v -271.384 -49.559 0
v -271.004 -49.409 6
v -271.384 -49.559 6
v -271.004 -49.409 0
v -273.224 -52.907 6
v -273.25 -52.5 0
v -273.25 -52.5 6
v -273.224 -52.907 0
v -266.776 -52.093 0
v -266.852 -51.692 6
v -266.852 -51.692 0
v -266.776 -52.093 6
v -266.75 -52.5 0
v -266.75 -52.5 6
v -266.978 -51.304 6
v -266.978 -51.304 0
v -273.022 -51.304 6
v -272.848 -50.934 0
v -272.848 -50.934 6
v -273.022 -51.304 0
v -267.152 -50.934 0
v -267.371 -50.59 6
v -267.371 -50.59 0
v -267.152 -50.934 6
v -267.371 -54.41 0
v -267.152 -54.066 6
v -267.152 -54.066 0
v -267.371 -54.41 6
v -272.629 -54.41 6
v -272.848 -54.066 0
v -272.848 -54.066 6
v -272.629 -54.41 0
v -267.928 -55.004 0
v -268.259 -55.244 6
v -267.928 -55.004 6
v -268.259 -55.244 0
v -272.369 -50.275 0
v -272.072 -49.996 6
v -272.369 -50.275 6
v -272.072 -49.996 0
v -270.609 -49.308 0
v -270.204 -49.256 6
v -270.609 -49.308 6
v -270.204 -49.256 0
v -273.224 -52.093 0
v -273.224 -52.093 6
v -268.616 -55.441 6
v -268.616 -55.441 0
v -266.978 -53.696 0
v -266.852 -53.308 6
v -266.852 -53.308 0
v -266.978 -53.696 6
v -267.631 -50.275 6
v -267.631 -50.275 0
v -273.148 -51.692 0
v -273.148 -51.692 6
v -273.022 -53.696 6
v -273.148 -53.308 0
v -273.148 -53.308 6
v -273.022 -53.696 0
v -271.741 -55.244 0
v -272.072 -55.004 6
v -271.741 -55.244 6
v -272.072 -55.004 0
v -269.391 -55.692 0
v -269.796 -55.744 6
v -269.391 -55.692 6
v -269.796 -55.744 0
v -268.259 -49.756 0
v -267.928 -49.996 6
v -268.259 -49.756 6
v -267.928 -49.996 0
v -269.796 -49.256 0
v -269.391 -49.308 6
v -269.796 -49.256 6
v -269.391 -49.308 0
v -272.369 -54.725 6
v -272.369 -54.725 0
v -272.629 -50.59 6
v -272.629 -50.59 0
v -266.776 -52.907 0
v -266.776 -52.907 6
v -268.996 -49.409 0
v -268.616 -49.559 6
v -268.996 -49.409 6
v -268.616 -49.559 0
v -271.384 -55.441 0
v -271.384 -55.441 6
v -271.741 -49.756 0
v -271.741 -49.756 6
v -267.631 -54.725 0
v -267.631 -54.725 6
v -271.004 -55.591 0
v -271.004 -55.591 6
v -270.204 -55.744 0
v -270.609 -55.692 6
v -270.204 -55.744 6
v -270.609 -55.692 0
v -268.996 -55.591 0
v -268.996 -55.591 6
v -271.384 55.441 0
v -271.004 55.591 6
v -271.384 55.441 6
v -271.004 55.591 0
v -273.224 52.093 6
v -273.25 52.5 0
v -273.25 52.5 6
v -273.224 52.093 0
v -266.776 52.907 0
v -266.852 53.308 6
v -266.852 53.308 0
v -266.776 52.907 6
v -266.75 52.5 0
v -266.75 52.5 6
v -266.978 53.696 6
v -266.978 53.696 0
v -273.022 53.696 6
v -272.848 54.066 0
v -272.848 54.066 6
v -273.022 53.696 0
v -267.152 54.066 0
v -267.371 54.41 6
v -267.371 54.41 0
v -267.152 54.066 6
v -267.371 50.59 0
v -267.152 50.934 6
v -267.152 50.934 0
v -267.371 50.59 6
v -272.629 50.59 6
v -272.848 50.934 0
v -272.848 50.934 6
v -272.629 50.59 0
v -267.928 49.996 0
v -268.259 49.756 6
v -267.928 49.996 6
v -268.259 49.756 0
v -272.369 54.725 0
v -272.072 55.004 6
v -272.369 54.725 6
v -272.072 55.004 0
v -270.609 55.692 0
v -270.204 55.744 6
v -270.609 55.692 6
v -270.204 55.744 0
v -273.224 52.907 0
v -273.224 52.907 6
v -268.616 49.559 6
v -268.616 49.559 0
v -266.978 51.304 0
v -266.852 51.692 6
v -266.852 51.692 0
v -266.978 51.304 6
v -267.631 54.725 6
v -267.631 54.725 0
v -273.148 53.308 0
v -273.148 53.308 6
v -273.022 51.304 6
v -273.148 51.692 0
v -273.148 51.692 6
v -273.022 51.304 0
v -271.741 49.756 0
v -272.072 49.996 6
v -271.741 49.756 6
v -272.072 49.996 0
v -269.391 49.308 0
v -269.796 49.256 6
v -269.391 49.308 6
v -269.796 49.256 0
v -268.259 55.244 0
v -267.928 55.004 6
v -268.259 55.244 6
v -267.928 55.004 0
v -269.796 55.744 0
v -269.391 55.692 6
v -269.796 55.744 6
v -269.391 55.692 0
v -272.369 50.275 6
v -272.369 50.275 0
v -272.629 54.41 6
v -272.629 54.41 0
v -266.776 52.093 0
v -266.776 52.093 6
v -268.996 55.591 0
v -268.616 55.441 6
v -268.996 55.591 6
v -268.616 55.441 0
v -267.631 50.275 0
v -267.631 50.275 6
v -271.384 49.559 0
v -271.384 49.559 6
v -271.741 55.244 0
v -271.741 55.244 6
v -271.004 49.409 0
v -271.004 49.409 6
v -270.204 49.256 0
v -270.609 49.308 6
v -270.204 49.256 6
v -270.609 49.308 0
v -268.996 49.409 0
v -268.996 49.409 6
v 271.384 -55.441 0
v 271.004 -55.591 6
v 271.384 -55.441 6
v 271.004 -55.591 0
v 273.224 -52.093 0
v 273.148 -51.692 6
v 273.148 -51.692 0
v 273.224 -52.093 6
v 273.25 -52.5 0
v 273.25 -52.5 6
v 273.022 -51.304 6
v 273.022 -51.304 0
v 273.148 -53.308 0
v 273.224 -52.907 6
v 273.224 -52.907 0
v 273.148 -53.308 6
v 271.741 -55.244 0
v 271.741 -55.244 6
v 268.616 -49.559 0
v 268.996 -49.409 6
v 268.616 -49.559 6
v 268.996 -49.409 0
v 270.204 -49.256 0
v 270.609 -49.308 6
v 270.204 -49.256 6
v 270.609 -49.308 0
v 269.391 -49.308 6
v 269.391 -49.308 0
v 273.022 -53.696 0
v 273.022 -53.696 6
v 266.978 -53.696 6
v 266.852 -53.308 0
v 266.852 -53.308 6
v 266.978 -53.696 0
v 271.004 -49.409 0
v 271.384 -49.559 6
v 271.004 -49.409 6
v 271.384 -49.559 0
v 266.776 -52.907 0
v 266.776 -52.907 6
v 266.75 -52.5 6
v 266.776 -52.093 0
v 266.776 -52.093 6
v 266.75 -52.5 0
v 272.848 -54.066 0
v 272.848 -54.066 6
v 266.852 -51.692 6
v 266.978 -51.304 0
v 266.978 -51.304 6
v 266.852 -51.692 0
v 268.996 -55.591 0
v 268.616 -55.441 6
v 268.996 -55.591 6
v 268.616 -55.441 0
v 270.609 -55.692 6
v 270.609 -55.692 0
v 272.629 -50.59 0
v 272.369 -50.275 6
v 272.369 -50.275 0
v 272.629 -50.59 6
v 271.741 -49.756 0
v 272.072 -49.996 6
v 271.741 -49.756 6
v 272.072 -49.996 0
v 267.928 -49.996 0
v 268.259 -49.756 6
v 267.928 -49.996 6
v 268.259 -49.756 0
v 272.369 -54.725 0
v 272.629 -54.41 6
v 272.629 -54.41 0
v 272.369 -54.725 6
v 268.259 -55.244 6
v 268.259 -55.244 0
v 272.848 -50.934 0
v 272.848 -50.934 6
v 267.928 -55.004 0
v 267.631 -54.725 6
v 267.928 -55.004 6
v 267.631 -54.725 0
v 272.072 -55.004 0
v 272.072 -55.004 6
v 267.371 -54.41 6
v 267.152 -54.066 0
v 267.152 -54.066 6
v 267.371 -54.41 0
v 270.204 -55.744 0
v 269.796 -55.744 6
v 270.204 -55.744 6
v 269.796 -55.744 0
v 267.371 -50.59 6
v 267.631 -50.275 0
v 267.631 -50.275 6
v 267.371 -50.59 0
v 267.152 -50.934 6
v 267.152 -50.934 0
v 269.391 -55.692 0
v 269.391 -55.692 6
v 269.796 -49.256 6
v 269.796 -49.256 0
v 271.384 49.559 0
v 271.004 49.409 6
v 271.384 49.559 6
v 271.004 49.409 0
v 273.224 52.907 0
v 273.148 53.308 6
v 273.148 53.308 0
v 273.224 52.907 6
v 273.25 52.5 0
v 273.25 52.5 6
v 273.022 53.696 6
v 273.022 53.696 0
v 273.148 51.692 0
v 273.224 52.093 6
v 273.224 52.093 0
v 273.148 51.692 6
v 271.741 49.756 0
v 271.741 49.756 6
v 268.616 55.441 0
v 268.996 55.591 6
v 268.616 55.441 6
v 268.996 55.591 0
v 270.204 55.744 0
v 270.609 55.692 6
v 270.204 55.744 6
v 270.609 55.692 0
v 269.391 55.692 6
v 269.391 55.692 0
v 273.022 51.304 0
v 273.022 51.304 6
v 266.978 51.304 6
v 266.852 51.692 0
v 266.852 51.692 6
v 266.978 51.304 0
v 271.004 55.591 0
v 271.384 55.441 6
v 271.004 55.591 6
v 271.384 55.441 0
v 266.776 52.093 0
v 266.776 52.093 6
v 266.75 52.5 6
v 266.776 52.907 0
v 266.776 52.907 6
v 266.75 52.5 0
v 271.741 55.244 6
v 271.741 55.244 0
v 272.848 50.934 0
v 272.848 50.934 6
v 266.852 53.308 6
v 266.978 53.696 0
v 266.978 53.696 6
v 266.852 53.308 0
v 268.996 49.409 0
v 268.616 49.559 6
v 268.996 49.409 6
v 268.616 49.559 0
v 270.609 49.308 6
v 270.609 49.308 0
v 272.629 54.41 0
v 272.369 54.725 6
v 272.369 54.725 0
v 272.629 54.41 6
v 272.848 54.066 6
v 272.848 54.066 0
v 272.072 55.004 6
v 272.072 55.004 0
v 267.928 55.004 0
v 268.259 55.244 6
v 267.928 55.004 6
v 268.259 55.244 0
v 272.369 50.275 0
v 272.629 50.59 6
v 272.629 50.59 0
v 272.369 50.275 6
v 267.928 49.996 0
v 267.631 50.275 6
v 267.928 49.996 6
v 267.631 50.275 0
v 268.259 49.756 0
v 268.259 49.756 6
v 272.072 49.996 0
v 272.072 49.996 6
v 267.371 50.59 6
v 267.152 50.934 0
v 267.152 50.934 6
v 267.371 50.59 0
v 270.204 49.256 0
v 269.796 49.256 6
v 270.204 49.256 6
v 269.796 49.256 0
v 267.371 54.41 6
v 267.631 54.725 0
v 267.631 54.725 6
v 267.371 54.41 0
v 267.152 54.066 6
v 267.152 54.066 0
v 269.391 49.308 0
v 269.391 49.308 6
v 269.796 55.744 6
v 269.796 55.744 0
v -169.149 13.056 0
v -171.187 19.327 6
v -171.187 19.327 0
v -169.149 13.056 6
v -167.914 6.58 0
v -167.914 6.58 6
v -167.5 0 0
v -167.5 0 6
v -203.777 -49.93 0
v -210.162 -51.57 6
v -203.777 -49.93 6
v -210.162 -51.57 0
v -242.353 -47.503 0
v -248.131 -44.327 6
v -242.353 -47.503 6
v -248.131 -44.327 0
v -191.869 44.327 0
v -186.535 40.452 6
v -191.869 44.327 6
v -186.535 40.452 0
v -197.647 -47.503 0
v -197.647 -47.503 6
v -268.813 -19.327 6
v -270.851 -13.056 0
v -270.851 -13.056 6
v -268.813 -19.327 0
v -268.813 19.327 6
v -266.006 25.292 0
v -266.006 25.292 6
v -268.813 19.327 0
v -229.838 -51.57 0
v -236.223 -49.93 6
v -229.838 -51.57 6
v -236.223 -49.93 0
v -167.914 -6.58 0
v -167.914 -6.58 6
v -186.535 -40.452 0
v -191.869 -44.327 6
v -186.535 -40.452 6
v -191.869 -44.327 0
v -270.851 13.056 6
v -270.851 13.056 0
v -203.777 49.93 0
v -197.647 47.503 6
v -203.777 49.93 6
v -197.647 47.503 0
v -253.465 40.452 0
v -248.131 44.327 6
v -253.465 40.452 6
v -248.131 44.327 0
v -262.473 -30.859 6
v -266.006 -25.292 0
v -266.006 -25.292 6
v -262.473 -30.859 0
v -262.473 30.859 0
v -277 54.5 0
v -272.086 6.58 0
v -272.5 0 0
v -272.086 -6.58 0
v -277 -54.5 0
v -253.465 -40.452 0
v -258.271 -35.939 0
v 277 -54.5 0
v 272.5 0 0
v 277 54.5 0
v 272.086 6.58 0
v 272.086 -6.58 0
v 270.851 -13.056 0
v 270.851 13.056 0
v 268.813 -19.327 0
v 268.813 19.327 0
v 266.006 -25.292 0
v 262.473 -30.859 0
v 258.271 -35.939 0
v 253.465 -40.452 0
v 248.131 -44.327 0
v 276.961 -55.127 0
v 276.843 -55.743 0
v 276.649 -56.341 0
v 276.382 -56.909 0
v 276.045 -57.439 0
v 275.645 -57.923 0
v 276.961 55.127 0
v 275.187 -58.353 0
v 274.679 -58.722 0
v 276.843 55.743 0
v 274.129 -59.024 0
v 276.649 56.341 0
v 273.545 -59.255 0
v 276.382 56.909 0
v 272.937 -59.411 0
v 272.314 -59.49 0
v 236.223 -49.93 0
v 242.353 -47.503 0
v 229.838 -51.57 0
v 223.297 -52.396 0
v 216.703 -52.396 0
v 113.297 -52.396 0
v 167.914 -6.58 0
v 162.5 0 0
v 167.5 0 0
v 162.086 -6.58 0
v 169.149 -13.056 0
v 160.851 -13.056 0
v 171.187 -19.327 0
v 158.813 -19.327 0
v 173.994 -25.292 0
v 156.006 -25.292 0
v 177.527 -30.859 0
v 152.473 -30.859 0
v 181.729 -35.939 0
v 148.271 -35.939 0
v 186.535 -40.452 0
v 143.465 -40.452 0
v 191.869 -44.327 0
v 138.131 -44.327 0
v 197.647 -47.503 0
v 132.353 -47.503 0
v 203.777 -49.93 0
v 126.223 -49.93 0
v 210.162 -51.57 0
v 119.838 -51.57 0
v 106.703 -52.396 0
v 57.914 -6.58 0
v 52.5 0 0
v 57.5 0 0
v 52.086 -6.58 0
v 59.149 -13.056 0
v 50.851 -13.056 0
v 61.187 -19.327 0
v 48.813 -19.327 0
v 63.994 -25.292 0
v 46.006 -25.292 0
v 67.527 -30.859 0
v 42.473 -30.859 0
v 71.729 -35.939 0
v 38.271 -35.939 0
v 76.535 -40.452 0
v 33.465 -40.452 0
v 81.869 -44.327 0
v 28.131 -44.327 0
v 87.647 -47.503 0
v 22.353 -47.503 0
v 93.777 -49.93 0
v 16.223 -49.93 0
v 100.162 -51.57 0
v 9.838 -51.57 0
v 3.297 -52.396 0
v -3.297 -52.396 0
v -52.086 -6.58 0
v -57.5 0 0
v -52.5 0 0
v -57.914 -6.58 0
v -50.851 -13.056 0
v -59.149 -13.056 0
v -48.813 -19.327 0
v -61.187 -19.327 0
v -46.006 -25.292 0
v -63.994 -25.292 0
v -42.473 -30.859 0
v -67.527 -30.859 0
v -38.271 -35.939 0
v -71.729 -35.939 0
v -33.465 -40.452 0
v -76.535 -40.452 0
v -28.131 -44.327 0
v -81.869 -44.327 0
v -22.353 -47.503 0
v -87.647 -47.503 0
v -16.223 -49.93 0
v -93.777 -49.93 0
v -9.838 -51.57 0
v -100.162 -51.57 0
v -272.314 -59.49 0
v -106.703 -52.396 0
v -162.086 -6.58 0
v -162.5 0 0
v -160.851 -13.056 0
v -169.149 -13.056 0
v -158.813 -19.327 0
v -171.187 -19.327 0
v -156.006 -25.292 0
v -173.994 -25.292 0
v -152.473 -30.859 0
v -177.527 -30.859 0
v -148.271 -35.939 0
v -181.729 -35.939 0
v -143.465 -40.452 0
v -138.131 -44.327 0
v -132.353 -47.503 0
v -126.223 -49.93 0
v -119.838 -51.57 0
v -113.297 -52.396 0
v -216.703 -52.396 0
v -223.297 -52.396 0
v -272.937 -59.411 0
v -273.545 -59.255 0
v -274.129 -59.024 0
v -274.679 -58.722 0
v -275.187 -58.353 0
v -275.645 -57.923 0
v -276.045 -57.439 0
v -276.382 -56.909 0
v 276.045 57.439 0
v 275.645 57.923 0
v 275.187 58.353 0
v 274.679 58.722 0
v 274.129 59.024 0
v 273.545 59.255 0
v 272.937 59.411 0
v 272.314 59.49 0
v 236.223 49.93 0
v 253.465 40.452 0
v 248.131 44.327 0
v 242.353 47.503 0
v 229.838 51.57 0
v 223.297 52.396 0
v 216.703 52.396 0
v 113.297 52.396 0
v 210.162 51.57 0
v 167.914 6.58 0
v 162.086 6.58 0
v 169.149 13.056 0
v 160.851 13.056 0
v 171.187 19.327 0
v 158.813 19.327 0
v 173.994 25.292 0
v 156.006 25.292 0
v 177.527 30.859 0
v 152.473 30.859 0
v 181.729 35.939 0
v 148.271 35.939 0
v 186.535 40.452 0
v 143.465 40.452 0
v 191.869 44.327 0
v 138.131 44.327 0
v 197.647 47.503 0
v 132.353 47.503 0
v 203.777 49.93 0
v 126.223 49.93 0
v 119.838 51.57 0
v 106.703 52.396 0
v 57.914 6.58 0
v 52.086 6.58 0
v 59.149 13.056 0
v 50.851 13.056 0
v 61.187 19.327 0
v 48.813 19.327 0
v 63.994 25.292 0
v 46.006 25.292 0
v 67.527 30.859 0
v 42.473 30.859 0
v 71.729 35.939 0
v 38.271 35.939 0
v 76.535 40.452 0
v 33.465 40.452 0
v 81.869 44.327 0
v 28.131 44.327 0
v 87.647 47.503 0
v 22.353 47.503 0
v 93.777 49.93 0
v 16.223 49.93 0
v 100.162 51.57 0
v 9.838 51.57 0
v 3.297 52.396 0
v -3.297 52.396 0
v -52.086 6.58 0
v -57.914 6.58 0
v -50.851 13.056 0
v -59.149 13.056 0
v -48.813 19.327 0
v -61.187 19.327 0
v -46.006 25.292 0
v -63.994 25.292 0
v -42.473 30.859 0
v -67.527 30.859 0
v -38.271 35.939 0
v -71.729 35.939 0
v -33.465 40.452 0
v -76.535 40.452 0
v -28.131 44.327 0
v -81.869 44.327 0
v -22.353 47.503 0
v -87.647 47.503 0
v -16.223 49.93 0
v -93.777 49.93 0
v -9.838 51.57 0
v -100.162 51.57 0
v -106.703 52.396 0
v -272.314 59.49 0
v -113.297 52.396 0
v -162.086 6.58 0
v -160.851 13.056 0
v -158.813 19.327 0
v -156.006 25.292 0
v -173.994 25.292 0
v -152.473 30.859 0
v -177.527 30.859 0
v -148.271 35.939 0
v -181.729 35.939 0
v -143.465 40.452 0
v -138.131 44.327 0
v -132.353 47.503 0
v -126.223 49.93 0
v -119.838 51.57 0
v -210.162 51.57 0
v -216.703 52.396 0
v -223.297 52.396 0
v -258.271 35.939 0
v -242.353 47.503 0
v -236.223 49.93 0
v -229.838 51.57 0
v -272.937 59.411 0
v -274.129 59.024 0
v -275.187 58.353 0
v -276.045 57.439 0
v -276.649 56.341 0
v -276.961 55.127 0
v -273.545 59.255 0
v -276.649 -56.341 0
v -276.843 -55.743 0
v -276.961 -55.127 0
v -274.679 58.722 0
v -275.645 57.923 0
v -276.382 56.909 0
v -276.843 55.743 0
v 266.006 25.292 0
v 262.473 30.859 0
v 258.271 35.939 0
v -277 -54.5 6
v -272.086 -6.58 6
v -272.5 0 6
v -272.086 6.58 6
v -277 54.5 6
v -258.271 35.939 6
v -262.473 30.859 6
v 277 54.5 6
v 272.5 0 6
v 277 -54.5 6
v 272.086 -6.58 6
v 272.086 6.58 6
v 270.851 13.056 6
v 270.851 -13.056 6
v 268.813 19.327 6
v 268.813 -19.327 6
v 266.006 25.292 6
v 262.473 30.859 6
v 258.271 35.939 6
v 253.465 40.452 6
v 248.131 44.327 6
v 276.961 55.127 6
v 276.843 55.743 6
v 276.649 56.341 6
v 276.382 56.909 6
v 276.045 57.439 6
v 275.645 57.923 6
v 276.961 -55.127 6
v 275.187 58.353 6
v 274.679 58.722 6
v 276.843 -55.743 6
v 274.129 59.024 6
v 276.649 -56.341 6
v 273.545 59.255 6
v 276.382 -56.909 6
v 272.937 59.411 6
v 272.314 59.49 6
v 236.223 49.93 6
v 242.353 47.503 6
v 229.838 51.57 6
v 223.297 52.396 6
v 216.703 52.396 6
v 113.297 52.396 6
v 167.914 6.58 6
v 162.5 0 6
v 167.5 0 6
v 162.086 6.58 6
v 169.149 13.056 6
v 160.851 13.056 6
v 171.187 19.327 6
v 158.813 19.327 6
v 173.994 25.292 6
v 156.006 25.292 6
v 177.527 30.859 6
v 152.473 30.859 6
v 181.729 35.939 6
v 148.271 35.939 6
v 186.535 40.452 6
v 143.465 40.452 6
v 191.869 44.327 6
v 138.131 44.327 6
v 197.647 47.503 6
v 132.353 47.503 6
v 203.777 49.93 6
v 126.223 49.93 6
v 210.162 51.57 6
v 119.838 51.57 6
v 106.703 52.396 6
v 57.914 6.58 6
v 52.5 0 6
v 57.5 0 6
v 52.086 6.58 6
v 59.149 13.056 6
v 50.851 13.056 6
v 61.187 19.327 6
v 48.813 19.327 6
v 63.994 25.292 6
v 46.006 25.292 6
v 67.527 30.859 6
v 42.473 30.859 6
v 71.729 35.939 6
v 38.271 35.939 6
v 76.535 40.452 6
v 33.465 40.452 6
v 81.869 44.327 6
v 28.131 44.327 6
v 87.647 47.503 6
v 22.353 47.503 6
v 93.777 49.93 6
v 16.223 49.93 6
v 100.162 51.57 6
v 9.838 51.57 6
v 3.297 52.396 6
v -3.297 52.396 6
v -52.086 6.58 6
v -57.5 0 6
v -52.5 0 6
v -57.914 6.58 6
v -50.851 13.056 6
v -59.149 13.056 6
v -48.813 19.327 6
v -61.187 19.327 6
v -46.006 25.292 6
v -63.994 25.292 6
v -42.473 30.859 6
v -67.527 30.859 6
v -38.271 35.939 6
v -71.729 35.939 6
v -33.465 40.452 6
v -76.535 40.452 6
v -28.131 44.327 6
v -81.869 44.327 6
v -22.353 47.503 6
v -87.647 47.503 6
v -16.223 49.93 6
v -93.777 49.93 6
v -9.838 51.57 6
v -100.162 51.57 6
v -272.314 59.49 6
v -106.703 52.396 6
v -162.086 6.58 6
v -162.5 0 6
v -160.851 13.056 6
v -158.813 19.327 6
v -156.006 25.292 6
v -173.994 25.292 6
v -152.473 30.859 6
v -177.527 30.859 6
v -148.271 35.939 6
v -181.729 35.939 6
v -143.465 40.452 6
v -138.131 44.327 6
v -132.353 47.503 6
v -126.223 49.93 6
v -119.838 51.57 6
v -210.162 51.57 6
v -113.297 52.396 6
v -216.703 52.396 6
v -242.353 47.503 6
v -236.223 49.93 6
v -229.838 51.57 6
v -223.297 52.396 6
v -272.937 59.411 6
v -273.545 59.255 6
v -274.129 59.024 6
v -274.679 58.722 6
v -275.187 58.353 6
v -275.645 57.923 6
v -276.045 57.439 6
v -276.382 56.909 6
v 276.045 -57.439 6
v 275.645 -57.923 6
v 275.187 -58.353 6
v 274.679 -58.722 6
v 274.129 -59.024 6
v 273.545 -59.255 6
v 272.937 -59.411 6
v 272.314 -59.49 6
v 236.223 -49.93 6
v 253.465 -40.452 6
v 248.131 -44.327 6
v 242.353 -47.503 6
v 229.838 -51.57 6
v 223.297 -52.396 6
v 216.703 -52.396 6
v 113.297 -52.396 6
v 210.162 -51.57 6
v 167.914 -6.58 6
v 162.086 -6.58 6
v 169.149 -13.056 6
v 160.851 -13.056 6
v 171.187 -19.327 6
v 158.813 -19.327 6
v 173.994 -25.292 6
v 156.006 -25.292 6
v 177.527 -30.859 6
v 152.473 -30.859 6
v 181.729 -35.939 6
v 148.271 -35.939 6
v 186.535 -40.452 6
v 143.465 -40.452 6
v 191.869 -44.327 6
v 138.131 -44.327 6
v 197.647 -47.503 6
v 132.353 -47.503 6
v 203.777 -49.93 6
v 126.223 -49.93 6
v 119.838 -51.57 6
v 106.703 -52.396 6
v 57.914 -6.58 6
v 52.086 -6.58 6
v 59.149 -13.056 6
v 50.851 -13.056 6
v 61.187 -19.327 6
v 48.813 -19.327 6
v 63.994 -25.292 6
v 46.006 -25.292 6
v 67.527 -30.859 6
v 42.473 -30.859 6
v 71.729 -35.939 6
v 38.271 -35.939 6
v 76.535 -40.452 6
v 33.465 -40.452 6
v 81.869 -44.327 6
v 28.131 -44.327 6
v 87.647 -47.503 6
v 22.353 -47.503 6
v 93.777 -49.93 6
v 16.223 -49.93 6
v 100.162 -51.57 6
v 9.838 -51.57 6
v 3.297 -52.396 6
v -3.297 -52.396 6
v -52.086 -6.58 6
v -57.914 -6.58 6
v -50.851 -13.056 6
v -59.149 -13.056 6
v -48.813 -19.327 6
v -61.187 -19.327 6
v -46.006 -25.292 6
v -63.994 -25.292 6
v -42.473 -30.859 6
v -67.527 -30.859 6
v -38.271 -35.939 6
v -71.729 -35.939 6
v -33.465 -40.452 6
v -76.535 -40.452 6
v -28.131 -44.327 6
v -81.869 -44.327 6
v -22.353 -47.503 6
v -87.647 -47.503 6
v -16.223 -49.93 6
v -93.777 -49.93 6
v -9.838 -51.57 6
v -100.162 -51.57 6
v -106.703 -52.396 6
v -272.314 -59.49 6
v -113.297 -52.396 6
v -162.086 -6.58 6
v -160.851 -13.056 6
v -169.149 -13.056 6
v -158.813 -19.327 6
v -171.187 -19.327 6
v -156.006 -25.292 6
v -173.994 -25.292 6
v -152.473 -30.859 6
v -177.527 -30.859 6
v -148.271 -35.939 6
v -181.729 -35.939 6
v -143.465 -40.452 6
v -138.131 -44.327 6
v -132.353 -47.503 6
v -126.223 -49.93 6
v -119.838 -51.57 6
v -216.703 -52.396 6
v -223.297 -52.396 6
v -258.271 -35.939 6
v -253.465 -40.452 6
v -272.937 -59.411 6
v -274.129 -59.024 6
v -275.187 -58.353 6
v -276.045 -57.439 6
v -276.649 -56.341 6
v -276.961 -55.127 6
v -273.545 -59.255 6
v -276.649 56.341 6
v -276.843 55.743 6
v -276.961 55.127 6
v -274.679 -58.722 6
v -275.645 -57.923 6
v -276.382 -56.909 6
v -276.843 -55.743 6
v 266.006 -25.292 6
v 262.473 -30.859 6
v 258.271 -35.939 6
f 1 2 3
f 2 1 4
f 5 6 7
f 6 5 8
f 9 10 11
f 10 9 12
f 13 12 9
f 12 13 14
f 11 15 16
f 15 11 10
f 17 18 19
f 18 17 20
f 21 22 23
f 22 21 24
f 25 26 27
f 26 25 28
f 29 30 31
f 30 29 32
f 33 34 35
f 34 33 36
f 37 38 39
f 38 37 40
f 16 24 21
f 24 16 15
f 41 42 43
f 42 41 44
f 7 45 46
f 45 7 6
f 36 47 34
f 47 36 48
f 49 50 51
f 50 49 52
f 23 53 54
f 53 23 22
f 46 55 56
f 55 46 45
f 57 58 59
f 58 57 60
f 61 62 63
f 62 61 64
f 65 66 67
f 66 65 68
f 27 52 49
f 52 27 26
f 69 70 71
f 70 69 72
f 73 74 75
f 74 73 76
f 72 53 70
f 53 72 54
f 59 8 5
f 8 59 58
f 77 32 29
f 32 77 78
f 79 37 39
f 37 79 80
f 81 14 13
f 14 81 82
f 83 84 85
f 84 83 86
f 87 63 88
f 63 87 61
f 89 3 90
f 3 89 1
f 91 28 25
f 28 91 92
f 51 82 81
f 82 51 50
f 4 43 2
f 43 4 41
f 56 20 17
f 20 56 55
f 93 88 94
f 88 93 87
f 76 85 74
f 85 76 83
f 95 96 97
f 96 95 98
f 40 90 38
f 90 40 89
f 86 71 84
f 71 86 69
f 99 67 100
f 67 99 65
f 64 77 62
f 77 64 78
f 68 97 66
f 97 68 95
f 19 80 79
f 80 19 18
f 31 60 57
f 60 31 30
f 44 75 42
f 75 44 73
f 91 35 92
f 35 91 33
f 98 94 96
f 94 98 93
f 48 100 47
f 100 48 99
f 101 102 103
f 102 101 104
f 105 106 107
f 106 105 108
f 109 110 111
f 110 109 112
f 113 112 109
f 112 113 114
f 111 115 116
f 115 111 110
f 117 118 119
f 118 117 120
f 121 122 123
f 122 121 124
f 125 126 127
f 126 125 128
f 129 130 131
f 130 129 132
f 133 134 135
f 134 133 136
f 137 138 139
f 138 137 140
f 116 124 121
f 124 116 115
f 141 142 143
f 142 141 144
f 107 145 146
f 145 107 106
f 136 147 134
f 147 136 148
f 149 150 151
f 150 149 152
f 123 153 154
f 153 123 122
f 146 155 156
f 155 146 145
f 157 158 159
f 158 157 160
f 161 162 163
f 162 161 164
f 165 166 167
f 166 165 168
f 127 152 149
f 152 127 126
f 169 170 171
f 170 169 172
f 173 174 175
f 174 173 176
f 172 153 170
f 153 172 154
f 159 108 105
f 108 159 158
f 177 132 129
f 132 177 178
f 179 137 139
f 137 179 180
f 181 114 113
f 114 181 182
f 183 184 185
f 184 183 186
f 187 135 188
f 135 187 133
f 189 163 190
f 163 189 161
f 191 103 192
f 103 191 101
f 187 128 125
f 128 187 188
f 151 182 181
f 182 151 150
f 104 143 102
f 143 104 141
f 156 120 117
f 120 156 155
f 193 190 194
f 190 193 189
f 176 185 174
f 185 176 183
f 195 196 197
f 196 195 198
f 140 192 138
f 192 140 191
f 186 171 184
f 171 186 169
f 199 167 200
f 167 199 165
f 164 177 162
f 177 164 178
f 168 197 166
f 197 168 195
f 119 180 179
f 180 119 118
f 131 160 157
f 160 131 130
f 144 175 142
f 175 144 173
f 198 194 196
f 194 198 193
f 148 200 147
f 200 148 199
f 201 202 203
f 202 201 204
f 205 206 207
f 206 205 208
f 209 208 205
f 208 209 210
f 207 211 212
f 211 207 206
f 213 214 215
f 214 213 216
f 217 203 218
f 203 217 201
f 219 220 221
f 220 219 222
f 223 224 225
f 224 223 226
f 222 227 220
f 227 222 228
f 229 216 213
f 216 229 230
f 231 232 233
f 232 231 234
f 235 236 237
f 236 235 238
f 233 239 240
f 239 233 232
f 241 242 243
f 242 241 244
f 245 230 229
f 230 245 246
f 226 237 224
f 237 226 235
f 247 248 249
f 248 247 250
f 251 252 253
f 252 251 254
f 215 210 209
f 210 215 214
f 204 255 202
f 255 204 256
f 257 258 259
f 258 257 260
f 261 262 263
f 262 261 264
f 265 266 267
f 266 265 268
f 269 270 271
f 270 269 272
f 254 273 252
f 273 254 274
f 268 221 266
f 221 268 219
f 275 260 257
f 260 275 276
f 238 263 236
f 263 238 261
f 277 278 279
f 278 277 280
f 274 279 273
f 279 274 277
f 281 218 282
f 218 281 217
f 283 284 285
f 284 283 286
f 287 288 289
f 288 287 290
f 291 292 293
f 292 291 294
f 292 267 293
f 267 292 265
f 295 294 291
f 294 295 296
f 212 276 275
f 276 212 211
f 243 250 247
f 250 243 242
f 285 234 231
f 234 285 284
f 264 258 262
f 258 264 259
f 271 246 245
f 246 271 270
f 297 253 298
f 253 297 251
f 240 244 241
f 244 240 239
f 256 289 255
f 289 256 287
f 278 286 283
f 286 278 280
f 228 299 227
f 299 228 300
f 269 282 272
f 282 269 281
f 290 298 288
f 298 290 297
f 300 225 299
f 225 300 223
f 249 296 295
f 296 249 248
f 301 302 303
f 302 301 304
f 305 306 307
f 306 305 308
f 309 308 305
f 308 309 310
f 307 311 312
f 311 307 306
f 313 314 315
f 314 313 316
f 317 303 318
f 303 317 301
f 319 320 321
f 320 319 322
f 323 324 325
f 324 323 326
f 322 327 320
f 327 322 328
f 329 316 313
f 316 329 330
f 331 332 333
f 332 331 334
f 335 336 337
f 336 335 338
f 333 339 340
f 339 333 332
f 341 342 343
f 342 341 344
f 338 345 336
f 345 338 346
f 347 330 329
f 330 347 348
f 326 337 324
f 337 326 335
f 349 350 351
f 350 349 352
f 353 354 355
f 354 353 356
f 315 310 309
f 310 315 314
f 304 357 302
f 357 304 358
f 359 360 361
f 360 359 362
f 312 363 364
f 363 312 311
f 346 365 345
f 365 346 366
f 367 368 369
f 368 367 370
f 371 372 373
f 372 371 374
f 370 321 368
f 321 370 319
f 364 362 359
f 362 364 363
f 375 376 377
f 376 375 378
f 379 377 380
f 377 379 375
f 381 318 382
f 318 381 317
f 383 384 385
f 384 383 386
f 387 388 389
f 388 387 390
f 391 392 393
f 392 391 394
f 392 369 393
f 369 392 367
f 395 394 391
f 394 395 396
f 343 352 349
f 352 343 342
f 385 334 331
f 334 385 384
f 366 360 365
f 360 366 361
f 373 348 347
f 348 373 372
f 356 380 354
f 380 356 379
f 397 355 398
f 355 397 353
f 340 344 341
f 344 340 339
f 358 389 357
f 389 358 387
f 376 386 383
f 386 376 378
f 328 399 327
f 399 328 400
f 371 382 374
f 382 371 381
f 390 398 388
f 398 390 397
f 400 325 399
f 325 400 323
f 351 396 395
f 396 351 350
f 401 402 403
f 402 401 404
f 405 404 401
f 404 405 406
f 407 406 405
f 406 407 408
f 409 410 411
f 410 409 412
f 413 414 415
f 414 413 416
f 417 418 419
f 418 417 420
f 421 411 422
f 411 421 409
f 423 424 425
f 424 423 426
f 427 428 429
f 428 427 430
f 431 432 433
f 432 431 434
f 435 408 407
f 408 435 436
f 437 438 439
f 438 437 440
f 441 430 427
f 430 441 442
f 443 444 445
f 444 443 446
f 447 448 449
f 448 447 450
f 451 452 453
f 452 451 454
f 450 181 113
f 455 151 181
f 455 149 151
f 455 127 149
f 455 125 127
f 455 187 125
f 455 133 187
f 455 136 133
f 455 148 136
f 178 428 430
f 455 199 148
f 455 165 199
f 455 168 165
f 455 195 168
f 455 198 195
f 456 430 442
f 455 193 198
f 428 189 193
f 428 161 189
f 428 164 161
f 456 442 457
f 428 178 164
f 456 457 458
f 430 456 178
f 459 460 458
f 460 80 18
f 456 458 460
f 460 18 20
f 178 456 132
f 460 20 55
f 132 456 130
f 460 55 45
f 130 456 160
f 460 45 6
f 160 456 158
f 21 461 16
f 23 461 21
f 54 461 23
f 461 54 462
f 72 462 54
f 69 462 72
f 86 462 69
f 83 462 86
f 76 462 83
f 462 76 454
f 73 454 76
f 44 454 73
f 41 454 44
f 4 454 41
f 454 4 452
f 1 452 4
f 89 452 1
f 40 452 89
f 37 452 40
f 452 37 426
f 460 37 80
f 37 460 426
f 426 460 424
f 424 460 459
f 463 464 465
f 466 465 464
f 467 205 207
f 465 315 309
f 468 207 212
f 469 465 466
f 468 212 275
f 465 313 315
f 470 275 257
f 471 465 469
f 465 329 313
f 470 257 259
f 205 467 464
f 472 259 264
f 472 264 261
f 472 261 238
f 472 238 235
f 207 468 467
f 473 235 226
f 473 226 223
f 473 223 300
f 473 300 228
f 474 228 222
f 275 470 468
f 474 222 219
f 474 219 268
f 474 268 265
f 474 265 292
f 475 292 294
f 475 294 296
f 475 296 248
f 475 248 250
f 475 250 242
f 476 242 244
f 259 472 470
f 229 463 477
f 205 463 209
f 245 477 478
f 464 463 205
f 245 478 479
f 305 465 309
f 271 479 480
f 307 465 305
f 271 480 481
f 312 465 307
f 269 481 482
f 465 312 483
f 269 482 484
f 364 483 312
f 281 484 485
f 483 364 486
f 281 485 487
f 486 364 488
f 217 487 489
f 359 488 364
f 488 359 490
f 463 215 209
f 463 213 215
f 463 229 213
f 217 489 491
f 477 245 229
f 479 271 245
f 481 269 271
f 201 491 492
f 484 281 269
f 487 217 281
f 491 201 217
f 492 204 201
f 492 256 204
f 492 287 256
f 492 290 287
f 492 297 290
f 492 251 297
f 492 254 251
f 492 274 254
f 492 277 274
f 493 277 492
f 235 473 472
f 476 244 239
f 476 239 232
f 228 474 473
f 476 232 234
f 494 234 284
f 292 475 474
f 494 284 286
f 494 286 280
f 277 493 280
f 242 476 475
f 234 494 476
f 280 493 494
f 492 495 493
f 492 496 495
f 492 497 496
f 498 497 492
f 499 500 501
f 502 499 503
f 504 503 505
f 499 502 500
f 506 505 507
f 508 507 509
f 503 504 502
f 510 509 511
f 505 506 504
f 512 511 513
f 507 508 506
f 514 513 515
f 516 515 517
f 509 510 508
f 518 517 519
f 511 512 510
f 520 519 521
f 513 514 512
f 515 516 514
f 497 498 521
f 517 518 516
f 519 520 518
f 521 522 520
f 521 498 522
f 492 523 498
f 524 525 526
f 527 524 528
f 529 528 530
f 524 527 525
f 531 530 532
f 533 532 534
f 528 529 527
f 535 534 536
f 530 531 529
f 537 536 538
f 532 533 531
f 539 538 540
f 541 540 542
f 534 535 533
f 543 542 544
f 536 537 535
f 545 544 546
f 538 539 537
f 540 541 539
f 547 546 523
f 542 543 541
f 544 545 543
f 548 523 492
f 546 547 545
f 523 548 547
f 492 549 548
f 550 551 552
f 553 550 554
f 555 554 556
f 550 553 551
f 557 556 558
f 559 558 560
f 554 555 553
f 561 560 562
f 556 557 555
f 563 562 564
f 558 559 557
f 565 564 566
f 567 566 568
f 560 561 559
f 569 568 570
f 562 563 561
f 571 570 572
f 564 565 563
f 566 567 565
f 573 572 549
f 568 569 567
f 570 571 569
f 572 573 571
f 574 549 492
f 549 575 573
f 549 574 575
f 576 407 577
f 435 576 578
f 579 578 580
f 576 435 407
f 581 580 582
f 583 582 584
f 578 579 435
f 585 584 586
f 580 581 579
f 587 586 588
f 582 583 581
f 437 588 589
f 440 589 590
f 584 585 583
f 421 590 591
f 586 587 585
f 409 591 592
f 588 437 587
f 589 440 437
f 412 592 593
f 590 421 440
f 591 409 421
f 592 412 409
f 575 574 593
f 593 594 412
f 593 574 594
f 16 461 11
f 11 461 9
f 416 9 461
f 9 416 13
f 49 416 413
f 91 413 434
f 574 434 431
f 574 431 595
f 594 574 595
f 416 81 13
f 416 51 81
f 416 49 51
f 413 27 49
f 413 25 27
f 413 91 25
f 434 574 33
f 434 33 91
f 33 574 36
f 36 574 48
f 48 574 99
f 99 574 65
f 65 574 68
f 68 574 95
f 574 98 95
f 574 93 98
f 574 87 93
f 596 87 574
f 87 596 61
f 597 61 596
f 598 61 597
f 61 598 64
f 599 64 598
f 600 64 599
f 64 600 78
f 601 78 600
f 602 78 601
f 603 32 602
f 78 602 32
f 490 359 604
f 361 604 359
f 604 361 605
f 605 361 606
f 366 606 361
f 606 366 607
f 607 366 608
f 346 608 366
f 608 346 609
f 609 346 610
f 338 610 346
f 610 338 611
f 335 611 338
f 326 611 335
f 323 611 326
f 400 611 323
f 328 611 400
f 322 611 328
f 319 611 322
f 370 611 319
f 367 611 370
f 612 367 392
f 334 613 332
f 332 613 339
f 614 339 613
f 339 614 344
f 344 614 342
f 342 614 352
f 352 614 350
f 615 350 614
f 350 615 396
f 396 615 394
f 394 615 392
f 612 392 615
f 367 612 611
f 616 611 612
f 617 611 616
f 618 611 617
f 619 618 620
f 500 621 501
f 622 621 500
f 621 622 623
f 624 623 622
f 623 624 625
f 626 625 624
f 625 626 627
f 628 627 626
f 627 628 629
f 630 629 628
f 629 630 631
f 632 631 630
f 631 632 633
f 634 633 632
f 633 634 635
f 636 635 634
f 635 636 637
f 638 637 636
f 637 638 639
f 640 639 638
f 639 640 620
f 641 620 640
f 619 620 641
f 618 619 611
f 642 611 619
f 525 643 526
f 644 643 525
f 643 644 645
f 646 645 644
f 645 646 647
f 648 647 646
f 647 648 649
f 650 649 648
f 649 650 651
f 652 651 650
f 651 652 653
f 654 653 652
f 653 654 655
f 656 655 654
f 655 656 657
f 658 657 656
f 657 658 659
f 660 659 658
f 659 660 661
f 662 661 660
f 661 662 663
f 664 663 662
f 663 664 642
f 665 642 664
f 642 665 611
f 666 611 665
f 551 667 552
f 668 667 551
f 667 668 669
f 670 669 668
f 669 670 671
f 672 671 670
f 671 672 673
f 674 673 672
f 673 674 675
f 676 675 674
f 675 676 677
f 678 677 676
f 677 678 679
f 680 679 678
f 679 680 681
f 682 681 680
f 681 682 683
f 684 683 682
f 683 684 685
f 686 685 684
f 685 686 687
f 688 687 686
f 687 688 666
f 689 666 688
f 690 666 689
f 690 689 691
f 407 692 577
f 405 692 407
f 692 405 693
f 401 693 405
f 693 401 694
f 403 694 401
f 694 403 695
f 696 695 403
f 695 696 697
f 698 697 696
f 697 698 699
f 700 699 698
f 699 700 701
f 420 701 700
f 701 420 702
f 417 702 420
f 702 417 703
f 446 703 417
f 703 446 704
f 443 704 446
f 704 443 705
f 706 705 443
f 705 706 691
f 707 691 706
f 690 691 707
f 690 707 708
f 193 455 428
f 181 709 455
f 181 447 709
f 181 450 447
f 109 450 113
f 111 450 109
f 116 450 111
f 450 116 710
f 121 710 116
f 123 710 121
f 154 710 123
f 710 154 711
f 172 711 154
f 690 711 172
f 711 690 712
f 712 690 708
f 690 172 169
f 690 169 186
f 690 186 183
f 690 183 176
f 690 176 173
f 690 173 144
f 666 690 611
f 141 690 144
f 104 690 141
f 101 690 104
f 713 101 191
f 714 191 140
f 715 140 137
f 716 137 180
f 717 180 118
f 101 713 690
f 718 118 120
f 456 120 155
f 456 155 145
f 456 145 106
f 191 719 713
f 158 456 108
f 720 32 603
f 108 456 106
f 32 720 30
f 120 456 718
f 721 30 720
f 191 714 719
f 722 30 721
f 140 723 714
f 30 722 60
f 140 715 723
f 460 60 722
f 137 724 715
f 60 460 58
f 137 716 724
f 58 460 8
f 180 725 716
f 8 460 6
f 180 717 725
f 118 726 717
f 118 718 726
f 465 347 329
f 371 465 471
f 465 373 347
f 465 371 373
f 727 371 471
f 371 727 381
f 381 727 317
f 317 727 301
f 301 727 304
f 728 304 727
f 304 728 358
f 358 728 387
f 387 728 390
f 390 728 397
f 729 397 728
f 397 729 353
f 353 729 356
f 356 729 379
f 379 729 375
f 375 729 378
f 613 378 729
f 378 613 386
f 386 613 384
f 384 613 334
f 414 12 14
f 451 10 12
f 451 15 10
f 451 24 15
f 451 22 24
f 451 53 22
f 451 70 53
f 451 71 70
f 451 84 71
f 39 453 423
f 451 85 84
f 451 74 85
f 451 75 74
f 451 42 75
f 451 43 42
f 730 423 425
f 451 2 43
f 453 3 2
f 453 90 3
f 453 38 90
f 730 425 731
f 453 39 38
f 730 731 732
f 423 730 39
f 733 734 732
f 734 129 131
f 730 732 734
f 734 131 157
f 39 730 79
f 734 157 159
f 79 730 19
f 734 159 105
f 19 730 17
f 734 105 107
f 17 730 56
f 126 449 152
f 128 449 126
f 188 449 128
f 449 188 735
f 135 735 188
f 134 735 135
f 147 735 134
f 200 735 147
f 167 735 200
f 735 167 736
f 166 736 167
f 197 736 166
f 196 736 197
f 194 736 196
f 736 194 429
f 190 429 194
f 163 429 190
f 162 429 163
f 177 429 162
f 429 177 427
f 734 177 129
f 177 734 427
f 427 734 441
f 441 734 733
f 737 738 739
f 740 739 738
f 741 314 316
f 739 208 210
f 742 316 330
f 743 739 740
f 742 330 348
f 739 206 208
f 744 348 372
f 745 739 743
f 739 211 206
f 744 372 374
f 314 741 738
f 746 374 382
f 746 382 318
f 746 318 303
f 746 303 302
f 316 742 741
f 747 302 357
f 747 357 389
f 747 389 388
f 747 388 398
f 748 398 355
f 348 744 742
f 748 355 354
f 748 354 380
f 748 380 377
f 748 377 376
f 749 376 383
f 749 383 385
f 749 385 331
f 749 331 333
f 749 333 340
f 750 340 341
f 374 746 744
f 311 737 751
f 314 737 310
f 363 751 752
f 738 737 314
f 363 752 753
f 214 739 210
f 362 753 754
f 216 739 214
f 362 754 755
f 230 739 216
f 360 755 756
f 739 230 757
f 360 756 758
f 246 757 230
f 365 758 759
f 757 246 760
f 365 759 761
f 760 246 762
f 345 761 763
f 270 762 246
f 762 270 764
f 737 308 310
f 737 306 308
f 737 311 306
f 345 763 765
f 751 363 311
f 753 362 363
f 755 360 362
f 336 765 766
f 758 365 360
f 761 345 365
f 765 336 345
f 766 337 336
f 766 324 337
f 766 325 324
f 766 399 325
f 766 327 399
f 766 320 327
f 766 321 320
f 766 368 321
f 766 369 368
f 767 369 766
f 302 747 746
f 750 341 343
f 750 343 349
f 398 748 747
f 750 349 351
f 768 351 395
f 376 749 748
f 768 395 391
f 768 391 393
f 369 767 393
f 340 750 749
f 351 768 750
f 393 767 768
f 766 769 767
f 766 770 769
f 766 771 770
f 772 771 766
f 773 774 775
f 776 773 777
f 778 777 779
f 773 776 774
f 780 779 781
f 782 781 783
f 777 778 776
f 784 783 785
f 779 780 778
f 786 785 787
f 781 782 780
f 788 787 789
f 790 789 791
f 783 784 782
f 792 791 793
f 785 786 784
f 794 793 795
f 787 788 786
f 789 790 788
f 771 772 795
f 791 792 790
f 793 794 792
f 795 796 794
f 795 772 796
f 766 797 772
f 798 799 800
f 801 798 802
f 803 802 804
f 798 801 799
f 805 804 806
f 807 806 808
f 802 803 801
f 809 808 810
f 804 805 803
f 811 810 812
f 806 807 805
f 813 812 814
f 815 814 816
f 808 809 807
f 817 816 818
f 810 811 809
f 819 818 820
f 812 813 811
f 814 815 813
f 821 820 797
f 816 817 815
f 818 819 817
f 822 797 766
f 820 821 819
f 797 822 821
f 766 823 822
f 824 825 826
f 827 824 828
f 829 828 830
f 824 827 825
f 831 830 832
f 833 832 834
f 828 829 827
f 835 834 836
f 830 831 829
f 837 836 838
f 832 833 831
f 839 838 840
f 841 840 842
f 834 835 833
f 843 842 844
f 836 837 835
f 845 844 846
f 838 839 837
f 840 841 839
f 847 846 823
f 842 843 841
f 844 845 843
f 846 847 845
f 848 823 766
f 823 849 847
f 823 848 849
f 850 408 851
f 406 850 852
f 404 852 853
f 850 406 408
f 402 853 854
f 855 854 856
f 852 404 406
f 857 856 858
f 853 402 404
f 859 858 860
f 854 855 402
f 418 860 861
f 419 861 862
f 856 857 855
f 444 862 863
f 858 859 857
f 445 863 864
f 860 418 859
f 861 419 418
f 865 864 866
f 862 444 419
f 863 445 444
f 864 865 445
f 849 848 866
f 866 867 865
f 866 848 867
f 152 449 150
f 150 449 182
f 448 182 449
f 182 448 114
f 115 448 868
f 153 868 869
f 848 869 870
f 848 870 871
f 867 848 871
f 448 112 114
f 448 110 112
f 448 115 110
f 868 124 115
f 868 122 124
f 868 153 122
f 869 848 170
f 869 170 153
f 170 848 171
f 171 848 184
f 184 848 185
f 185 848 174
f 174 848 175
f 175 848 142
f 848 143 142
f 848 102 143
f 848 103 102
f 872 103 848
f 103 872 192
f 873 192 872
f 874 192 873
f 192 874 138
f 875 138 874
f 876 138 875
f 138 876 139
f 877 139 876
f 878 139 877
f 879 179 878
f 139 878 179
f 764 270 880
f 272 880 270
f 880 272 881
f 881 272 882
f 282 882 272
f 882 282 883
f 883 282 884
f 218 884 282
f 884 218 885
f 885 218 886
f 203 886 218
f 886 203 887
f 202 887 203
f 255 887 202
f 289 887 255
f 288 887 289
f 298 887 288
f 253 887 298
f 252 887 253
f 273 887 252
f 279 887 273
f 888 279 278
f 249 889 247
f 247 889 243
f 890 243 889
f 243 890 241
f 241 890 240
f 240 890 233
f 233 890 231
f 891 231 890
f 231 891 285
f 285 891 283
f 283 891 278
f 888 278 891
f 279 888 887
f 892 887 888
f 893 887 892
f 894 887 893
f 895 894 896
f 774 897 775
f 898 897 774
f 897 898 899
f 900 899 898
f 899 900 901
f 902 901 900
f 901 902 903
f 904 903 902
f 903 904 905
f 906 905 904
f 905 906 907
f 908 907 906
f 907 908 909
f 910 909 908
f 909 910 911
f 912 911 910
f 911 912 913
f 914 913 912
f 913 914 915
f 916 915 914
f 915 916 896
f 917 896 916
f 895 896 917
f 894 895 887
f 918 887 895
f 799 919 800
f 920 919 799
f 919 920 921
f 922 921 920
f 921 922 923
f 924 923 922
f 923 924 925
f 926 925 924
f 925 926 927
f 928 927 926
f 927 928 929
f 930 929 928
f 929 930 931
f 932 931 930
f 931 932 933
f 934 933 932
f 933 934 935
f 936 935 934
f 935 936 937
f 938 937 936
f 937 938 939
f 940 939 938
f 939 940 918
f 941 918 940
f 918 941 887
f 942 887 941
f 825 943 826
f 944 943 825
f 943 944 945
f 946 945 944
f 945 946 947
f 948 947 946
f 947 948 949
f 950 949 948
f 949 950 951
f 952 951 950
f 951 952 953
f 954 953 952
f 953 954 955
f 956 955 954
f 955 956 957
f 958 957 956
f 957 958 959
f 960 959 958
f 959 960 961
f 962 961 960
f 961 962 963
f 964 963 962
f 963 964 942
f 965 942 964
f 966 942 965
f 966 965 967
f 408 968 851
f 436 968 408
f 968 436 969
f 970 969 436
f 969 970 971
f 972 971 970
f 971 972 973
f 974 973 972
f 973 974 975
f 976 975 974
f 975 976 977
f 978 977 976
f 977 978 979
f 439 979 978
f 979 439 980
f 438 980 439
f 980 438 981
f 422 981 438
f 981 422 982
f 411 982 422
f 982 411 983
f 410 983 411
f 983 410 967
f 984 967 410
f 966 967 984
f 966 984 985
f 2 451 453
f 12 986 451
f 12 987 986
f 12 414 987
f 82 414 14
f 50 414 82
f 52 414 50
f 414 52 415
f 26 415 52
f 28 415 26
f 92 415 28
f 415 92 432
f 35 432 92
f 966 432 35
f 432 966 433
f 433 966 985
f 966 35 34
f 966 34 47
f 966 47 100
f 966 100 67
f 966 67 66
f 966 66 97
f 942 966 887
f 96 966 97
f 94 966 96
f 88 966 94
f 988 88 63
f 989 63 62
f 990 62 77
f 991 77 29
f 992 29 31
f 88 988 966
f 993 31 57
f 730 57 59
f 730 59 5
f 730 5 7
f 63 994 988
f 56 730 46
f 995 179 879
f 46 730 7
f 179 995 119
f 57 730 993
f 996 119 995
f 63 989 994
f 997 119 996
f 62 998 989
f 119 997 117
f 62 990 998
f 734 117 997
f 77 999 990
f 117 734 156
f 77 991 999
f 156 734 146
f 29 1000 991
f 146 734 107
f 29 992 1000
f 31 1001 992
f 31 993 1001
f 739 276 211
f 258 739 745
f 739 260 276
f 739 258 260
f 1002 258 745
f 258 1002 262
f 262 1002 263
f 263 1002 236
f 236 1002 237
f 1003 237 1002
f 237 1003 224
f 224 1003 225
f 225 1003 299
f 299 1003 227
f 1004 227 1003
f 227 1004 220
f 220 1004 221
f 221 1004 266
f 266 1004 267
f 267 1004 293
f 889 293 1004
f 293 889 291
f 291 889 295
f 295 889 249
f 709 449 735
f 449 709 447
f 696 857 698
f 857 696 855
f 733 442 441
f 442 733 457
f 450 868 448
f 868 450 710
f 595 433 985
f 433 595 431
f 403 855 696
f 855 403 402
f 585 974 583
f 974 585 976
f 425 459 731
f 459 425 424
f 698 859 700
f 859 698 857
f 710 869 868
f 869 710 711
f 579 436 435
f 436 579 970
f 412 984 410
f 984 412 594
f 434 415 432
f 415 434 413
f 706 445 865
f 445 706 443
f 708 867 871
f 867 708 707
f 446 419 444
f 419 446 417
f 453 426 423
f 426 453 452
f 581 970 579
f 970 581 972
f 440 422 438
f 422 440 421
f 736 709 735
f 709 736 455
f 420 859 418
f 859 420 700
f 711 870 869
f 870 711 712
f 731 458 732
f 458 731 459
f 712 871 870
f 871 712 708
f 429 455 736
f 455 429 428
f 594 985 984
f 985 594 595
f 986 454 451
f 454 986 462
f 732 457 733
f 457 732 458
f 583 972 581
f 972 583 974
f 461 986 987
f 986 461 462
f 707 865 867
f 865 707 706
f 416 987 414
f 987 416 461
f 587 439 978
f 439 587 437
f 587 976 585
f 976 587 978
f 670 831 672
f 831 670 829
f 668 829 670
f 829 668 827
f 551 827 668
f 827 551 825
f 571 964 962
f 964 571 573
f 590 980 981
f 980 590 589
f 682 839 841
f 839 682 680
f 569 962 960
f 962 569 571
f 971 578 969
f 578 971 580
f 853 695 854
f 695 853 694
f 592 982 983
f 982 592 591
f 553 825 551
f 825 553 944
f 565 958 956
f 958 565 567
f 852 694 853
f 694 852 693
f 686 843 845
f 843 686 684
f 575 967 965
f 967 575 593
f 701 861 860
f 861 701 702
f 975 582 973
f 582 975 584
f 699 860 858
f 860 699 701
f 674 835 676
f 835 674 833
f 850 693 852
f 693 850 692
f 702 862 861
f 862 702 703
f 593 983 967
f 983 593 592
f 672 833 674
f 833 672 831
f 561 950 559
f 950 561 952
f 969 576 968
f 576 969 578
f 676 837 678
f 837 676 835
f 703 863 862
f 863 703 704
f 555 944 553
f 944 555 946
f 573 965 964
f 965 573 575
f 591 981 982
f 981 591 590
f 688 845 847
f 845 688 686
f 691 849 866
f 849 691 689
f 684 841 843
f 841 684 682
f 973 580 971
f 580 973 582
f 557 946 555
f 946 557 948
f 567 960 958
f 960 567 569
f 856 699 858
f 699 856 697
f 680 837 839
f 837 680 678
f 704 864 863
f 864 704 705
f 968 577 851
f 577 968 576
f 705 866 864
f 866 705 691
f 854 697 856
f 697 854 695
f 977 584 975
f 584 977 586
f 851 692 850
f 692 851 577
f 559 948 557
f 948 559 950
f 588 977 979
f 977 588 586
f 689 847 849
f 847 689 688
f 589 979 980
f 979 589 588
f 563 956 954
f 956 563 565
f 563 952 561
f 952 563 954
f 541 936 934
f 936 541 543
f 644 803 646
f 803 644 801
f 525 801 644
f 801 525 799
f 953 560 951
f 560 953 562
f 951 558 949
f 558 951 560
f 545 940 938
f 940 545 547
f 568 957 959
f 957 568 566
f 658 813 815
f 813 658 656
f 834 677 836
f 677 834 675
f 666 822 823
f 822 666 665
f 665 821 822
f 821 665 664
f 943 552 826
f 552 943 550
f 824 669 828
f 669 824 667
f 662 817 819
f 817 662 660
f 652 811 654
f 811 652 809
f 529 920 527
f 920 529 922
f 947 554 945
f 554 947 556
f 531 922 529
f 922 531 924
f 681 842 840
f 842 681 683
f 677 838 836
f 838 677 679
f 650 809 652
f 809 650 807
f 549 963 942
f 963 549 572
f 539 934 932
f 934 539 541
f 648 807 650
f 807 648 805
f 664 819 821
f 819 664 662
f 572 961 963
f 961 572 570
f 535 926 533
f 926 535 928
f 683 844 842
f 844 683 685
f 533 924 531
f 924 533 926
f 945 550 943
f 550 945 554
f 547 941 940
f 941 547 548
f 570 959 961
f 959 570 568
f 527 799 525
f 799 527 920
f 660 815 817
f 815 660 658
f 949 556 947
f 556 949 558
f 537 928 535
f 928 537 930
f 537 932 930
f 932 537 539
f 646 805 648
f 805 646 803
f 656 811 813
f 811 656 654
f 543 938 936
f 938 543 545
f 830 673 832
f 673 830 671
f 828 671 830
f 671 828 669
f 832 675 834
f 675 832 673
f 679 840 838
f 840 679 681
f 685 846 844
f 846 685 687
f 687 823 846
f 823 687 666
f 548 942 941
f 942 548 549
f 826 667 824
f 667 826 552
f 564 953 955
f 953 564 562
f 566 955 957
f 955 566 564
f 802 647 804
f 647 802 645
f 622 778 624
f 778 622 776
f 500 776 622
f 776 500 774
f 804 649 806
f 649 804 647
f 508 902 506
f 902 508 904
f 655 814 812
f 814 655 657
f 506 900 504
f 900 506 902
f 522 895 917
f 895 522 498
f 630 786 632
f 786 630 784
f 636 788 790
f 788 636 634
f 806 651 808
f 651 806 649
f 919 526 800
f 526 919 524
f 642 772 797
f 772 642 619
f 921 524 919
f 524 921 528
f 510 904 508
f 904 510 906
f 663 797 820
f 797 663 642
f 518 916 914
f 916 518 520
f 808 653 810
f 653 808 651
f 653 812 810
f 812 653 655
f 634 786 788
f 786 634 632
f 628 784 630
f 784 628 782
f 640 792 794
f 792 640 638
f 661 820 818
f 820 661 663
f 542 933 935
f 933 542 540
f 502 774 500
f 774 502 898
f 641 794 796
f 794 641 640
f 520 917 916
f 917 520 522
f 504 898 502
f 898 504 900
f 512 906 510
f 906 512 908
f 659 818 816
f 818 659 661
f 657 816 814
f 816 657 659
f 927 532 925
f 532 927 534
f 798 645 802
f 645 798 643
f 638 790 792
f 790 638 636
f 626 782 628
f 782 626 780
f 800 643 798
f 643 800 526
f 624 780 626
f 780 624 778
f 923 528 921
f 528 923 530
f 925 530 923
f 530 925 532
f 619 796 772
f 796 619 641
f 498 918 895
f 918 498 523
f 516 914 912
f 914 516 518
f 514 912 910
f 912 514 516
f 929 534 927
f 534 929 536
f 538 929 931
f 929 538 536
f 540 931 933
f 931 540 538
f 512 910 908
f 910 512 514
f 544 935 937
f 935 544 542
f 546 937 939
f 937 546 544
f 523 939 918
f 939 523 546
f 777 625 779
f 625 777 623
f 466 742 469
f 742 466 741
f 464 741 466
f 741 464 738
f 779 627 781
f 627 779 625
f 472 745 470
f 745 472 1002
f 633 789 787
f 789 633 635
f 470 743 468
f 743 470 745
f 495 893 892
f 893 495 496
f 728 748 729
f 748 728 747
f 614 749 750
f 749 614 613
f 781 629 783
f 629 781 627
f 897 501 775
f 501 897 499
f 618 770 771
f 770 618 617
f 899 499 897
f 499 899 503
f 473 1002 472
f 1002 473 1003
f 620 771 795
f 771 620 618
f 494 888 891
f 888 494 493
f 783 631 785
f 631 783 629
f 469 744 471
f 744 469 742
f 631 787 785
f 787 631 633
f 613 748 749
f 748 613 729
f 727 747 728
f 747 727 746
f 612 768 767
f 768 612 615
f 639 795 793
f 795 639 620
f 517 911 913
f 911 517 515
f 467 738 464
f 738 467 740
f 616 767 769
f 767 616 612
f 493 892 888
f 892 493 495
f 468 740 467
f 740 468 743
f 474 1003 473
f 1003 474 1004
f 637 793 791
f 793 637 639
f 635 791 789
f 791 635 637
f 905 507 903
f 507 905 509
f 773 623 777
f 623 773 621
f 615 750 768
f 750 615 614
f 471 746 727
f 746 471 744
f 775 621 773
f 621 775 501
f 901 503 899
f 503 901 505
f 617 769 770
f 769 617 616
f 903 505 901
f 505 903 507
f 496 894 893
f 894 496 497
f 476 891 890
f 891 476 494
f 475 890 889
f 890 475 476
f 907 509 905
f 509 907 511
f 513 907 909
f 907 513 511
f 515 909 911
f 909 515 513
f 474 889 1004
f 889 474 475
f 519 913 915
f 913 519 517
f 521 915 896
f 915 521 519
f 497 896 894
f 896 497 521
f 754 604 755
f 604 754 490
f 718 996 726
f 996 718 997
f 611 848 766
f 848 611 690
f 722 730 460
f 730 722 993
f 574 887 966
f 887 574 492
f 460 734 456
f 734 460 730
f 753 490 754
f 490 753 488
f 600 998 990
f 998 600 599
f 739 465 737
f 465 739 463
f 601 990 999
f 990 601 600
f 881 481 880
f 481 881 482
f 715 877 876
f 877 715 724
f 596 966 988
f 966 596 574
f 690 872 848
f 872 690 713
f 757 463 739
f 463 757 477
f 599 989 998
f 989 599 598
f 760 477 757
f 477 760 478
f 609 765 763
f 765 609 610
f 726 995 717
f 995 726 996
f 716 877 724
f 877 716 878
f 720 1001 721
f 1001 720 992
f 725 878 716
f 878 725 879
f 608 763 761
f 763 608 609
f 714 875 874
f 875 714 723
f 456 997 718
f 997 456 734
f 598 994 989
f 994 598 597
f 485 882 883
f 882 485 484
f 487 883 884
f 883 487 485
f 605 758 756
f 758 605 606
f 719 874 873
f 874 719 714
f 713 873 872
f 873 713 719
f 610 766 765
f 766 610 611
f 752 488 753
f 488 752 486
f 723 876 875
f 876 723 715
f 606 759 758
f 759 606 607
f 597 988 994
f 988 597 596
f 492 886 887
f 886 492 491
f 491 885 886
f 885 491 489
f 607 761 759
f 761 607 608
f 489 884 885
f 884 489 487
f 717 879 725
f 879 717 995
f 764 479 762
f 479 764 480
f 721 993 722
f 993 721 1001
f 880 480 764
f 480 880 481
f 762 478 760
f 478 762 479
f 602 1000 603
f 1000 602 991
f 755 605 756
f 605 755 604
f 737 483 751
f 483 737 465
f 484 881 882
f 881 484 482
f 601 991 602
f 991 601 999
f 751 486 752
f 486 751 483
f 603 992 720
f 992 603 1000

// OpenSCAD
$fn = 50;

difference() {
	union() {
		hull() {
			translate(v = [-272.0, 54.5, 0]) {
				cylinder(h = 6, r = 5);
			}
			translate(v = [272.0, 54.5, 0]) {
				cylinder(h = 6, r = 5);
			}
			translate(v = [-272.0, -54.5, 0]) {
				cylinder(h = 6, r = 5);
			}
			translate(v = [272.0, -54.5, 0]) {
				cylinder(h = 6, r = 5);
			}
		}
	}
	union() {
		translate(v = [-270.0, -52.5, -100.0]) {
			cylinder(h = 200, r = 3.25);
		}
		translate(v = [-270.0, 52.5, -100.0]) {
			cylinder(h = 200, r = 3.25);
		}
		translate(v = [270.0, -52.5, -100.0]) {
			cylinder(h = 200, r = 3.25);
		}
		translate(v = [270.0, 52.5, -100.0]) {
			cylinder(h = 200, r = 3.25);
		}
		translate(v = [-270.0, -52.5, -100.0]) {
			cylinder(h = 200, r = 1.8);
		}
		translate(v = [-270.0, 52.5, -100.0]) {
			cylinder(h = 200, r = 1.8);
		}
		translate(v = [270.0, -52.5, -100.0]) {
			cylinder(h = 200, r = 1.8);
		}
		translate(v = [270.0, 52.5, -100.0]) {
			cylinder(h = 200, r = 1.8);
		}
		translate(v = [-220.0, 0, 0.0]) {
			cylinder(h = 6, r = 52.5);
		}
		translate(v = [-110.0, 0, 0.0]) {
			cylinder(h = 6, r = 52.5);
		}
		cylinder(h = 6, r = 52.5);
		translate(v = [110.0, 0, 0.0]) {
			cylinder(h = 6, r = 52.5);
		}
		translate(v = [220.0, 0, 0.0]) {
			cylinder(h = 6, r = 52.5);
		}
	}
}
